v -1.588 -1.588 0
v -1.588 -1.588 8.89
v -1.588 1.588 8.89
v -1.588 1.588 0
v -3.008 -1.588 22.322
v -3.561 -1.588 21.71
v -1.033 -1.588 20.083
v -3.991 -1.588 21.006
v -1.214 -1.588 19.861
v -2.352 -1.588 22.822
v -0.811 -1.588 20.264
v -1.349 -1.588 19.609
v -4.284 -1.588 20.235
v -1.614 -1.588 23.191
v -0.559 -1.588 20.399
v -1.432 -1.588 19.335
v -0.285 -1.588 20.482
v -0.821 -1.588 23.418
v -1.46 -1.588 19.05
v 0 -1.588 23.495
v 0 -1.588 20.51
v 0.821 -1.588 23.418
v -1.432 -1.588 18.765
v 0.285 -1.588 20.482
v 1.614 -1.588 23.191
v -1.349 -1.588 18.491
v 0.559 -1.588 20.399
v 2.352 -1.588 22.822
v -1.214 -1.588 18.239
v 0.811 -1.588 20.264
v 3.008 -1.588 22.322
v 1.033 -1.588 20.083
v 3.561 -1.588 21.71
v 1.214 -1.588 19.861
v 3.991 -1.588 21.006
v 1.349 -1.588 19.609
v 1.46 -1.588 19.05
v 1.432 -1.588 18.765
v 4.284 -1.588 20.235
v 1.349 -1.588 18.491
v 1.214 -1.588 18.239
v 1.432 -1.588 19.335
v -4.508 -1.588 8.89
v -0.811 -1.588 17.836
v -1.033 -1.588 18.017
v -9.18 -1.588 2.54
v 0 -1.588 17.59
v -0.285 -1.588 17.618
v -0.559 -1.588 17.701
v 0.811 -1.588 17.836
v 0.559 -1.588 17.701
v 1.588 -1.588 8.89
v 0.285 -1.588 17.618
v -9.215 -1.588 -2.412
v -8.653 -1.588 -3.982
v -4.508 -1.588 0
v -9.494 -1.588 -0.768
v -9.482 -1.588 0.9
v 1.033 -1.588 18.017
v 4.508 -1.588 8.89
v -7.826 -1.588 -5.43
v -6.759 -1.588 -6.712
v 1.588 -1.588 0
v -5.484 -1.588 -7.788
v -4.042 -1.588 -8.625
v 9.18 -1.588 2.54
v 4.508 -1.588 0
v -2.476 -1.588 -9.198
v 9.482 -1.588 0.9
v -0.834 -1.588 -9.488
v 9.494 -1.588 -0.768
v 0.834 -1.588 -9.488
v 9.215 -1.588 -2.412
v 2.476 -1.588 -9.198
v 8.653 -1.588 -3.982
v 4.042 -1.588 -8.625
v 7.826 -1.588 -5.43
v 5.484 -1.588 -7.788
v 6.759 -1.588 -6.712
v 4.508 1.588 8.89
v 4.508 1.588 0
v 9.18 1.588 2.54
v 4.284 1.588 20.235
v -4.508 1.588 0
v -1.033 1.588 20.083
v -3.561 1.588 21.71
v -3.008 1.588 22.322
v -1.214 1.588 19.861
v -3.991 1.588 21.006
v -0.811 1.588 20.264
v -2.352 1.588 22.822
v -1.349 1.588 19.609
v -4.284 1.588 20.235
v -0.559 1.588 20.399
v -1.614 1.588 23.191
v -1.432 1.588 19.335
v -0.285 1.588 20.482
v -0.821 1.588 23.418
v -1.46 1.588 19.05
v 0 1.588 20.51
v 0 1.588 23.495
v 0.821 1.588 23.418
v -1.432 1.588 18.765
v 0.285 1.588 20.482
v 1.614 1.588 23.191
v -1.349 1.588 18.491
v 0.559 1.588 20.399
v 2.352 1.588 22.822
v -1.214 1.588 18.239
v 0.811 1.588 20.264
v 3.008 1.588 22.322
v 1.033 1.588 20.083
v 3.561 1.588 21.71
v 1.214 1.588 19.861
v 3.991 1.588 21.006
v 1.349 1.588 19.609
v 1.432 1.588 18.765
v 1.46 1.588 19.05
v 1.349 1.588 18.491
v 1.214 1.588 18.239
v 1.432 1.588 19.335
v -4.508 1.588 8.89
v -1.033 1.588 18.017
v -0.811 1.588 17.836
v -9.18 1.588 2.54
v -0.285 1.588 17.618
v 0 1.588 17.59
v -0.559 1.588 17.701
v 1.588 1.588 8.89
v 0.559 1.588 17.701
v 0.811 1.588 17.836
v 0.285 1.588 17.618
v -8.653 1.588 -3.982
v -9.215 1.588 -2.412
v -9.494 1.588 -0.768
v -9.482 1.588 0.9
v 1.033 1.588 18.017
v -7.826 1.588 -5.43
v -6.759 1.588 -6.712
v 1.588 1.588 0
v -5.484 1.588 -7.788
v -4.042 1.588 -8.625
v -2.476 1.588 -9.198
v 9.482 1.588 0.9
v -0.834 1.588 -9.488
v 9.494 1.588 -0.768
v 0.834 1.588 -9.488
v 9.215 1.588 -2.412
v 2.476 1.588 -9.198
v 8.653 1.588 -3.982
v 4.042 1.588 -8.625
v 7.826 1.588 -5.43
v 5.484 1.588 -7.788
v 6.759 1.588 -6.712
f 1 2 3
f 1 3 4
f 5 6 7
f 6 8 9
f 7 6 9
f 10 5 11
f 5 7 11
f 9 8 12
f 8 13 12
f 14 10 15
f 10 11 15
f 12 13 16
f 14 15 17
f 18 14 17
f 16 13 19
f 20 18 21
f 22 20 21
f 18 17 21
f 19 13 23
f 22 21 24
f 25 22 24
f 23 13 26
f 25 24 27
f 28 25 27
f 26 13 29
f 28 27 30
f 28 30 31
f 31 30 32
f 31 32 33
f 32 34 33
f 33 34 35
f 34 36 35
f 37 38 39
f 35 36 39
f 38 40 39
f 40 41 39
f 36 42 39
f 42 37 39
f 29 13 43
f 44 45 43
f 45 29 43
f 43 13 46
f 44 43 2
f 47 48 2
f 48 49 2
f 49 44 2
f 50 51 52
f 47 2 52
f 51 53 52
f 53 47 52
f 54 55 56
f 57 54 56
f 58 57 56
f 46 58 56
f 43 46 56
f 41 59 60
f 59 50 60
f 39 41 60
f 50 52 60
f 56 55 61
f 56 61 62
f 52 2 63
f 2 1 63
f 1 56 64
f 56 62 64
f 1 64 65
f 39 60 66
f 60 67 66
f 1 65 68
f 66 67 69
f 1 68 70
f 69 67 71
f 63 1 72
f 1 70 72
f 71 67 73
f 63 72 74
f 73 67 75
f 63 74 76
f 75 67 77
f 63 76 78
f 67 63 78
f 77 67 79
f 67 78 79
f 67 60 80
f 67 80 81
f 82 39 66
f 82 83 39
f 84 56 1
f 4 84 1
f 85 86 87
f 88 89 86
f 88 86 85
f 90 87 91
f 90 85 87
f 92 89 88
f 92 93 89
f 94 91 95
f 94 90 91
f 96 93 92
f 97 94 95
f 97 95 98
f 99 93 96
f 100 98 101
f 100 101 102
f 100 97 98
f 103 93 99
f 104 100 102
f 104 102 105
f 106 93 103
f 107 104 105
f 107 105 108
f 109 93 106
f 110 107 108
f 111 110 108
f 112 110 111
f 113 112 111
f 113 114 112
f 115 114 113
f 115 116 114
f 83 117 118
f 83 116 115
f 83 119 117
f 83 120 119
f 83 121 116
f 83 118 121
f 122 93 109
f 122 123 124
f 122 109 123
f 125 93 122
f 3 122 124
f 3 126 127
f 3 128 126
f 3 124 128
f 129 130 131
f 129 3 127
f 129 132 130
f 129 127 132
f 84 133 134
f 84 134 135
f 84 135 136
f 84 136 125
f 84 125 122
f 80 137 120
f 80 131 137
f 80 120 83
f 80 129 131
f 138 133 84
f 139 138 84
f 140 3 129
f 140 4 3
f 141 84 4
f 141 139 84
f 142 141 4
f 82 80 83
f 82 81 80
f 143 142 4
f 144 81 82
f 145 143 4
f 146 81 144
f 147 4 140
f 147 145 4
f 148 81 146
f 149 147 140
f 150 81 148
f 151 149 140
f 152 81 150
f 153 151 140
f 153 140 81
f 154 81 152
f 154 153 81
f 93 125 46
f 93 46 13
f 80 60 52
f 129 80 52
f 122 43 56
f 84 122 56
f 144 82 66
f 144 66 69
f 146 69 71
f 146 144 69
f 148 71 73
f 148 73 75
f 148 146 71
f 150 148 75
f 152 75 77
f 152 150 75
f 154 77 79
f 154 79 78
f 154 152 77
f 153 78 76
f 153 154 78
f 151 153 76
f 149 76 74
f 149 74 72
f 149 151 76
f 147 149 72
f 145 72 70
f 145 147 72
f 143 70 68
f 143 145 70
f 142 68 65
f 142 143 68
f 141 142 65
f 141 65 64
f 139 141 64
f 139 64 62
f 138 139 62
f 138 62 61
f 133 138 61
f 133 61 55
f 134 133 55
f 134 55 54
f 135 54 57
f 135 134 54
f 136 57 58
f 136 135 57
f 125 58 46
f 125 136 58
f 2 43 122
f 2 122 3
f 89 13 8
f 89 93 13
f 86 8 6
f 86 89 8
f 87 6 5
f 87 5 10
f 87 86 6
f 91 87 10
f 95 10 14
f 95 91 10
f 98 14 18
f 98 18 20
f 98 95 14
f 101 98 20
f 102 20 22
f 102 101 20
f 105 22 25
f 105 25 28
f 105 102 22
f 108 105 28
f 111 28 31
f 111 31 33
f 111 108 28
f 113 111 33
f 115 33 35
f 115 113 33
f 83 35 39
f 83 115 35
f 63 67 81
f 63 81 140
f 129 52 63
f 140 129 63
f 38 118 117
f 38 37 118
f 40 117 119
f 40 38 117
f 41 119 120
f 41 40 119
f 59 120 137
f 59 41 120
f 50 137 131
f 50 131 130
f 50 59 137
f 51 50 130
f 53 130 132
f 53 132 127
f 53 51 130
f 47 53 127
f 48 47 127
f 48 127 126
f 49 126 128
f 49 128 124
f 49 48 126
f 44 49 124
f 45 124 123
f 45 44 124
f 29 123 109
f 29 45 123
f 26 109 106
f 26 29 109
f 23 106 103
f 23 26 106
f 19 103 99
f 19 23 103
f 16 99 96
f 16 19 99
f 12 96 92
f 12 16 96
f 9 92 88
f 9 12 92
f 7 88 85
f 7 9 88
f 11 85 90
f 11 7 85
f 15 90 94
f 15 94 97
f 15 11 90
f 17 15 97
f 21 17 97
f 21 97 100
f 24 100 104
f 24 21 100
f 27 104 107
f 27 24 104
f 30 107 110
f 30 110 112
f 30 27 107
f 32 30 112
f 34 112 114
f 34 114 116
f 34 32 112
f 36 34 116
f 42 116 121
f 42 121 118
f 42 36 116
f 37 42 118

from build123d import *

# Parameters (mm, degrees)
SKETCH1_R           = 1.4605
BOSS_EXTRUDE1_DEPTH = 1.5875
CUT_EXTRUDE1_START  = -4.175
SKETCH2_W           = 2.921
SKETCH2_H           = 8.89
CUT_EXTRUDE1_DEPTH  = 5.175


with BuildPart() as part:
    # Sketch1 → Boss-Extrude1 (new body, symmetric)
    with BuildSketch(Plane(origin=(0, 0, 0), x_dir=(1, 0, 0), z_dir=(0, 1, 0))):
        with BuildLine():
            Line((4.284041303, -20.235333333), (9.180088507, -2.54))
            ThreePointArc((9.180088507, -2.54), (0, 9.525), (-9.180088507, -2.54))
            Line((-9.180088507, -2.54), (-4.284041303, -20.235333333))
            ThreePointArc((-4.284041303, -20.235333333), (0, -23.495), (4.284041303, -20.235333333))
        make_face()
        with Locations((0, -19.05)):
            Circle(SKETCH1_R, mode=Mode.SUBTRACT)
    extrude(amount=BOSS_EXTRUDE1_DEPTH, both=True)

    # Sketch2 → Cut-Extrude1 (cut)
    with BuildSketch(Plane(origin=(0, 1.5875, 0), x_dir=(1, 0, 0), z_dir=(0, 1, 0)).offset(CUT_EXTRUDE1_START)):
        with Locations((-3.048, -4.445)):
            Rectangle(SKETCH2_W, SKETCH2_H)
    cut_extrude1 = extrude(amount=CUT_EXTRUDE1_DEPTH, mode=Mode.SUBTRACT)

    # Mirror1: Cut-Extrude1 across plane
    add(cut_extrude1.mirror(Plane(origin=(0, 0, 0), x_dir=(0, 0, 1), z_dir=(1, 0, 0))), mode=Mode.SUBTRACT)


solid = part.part
